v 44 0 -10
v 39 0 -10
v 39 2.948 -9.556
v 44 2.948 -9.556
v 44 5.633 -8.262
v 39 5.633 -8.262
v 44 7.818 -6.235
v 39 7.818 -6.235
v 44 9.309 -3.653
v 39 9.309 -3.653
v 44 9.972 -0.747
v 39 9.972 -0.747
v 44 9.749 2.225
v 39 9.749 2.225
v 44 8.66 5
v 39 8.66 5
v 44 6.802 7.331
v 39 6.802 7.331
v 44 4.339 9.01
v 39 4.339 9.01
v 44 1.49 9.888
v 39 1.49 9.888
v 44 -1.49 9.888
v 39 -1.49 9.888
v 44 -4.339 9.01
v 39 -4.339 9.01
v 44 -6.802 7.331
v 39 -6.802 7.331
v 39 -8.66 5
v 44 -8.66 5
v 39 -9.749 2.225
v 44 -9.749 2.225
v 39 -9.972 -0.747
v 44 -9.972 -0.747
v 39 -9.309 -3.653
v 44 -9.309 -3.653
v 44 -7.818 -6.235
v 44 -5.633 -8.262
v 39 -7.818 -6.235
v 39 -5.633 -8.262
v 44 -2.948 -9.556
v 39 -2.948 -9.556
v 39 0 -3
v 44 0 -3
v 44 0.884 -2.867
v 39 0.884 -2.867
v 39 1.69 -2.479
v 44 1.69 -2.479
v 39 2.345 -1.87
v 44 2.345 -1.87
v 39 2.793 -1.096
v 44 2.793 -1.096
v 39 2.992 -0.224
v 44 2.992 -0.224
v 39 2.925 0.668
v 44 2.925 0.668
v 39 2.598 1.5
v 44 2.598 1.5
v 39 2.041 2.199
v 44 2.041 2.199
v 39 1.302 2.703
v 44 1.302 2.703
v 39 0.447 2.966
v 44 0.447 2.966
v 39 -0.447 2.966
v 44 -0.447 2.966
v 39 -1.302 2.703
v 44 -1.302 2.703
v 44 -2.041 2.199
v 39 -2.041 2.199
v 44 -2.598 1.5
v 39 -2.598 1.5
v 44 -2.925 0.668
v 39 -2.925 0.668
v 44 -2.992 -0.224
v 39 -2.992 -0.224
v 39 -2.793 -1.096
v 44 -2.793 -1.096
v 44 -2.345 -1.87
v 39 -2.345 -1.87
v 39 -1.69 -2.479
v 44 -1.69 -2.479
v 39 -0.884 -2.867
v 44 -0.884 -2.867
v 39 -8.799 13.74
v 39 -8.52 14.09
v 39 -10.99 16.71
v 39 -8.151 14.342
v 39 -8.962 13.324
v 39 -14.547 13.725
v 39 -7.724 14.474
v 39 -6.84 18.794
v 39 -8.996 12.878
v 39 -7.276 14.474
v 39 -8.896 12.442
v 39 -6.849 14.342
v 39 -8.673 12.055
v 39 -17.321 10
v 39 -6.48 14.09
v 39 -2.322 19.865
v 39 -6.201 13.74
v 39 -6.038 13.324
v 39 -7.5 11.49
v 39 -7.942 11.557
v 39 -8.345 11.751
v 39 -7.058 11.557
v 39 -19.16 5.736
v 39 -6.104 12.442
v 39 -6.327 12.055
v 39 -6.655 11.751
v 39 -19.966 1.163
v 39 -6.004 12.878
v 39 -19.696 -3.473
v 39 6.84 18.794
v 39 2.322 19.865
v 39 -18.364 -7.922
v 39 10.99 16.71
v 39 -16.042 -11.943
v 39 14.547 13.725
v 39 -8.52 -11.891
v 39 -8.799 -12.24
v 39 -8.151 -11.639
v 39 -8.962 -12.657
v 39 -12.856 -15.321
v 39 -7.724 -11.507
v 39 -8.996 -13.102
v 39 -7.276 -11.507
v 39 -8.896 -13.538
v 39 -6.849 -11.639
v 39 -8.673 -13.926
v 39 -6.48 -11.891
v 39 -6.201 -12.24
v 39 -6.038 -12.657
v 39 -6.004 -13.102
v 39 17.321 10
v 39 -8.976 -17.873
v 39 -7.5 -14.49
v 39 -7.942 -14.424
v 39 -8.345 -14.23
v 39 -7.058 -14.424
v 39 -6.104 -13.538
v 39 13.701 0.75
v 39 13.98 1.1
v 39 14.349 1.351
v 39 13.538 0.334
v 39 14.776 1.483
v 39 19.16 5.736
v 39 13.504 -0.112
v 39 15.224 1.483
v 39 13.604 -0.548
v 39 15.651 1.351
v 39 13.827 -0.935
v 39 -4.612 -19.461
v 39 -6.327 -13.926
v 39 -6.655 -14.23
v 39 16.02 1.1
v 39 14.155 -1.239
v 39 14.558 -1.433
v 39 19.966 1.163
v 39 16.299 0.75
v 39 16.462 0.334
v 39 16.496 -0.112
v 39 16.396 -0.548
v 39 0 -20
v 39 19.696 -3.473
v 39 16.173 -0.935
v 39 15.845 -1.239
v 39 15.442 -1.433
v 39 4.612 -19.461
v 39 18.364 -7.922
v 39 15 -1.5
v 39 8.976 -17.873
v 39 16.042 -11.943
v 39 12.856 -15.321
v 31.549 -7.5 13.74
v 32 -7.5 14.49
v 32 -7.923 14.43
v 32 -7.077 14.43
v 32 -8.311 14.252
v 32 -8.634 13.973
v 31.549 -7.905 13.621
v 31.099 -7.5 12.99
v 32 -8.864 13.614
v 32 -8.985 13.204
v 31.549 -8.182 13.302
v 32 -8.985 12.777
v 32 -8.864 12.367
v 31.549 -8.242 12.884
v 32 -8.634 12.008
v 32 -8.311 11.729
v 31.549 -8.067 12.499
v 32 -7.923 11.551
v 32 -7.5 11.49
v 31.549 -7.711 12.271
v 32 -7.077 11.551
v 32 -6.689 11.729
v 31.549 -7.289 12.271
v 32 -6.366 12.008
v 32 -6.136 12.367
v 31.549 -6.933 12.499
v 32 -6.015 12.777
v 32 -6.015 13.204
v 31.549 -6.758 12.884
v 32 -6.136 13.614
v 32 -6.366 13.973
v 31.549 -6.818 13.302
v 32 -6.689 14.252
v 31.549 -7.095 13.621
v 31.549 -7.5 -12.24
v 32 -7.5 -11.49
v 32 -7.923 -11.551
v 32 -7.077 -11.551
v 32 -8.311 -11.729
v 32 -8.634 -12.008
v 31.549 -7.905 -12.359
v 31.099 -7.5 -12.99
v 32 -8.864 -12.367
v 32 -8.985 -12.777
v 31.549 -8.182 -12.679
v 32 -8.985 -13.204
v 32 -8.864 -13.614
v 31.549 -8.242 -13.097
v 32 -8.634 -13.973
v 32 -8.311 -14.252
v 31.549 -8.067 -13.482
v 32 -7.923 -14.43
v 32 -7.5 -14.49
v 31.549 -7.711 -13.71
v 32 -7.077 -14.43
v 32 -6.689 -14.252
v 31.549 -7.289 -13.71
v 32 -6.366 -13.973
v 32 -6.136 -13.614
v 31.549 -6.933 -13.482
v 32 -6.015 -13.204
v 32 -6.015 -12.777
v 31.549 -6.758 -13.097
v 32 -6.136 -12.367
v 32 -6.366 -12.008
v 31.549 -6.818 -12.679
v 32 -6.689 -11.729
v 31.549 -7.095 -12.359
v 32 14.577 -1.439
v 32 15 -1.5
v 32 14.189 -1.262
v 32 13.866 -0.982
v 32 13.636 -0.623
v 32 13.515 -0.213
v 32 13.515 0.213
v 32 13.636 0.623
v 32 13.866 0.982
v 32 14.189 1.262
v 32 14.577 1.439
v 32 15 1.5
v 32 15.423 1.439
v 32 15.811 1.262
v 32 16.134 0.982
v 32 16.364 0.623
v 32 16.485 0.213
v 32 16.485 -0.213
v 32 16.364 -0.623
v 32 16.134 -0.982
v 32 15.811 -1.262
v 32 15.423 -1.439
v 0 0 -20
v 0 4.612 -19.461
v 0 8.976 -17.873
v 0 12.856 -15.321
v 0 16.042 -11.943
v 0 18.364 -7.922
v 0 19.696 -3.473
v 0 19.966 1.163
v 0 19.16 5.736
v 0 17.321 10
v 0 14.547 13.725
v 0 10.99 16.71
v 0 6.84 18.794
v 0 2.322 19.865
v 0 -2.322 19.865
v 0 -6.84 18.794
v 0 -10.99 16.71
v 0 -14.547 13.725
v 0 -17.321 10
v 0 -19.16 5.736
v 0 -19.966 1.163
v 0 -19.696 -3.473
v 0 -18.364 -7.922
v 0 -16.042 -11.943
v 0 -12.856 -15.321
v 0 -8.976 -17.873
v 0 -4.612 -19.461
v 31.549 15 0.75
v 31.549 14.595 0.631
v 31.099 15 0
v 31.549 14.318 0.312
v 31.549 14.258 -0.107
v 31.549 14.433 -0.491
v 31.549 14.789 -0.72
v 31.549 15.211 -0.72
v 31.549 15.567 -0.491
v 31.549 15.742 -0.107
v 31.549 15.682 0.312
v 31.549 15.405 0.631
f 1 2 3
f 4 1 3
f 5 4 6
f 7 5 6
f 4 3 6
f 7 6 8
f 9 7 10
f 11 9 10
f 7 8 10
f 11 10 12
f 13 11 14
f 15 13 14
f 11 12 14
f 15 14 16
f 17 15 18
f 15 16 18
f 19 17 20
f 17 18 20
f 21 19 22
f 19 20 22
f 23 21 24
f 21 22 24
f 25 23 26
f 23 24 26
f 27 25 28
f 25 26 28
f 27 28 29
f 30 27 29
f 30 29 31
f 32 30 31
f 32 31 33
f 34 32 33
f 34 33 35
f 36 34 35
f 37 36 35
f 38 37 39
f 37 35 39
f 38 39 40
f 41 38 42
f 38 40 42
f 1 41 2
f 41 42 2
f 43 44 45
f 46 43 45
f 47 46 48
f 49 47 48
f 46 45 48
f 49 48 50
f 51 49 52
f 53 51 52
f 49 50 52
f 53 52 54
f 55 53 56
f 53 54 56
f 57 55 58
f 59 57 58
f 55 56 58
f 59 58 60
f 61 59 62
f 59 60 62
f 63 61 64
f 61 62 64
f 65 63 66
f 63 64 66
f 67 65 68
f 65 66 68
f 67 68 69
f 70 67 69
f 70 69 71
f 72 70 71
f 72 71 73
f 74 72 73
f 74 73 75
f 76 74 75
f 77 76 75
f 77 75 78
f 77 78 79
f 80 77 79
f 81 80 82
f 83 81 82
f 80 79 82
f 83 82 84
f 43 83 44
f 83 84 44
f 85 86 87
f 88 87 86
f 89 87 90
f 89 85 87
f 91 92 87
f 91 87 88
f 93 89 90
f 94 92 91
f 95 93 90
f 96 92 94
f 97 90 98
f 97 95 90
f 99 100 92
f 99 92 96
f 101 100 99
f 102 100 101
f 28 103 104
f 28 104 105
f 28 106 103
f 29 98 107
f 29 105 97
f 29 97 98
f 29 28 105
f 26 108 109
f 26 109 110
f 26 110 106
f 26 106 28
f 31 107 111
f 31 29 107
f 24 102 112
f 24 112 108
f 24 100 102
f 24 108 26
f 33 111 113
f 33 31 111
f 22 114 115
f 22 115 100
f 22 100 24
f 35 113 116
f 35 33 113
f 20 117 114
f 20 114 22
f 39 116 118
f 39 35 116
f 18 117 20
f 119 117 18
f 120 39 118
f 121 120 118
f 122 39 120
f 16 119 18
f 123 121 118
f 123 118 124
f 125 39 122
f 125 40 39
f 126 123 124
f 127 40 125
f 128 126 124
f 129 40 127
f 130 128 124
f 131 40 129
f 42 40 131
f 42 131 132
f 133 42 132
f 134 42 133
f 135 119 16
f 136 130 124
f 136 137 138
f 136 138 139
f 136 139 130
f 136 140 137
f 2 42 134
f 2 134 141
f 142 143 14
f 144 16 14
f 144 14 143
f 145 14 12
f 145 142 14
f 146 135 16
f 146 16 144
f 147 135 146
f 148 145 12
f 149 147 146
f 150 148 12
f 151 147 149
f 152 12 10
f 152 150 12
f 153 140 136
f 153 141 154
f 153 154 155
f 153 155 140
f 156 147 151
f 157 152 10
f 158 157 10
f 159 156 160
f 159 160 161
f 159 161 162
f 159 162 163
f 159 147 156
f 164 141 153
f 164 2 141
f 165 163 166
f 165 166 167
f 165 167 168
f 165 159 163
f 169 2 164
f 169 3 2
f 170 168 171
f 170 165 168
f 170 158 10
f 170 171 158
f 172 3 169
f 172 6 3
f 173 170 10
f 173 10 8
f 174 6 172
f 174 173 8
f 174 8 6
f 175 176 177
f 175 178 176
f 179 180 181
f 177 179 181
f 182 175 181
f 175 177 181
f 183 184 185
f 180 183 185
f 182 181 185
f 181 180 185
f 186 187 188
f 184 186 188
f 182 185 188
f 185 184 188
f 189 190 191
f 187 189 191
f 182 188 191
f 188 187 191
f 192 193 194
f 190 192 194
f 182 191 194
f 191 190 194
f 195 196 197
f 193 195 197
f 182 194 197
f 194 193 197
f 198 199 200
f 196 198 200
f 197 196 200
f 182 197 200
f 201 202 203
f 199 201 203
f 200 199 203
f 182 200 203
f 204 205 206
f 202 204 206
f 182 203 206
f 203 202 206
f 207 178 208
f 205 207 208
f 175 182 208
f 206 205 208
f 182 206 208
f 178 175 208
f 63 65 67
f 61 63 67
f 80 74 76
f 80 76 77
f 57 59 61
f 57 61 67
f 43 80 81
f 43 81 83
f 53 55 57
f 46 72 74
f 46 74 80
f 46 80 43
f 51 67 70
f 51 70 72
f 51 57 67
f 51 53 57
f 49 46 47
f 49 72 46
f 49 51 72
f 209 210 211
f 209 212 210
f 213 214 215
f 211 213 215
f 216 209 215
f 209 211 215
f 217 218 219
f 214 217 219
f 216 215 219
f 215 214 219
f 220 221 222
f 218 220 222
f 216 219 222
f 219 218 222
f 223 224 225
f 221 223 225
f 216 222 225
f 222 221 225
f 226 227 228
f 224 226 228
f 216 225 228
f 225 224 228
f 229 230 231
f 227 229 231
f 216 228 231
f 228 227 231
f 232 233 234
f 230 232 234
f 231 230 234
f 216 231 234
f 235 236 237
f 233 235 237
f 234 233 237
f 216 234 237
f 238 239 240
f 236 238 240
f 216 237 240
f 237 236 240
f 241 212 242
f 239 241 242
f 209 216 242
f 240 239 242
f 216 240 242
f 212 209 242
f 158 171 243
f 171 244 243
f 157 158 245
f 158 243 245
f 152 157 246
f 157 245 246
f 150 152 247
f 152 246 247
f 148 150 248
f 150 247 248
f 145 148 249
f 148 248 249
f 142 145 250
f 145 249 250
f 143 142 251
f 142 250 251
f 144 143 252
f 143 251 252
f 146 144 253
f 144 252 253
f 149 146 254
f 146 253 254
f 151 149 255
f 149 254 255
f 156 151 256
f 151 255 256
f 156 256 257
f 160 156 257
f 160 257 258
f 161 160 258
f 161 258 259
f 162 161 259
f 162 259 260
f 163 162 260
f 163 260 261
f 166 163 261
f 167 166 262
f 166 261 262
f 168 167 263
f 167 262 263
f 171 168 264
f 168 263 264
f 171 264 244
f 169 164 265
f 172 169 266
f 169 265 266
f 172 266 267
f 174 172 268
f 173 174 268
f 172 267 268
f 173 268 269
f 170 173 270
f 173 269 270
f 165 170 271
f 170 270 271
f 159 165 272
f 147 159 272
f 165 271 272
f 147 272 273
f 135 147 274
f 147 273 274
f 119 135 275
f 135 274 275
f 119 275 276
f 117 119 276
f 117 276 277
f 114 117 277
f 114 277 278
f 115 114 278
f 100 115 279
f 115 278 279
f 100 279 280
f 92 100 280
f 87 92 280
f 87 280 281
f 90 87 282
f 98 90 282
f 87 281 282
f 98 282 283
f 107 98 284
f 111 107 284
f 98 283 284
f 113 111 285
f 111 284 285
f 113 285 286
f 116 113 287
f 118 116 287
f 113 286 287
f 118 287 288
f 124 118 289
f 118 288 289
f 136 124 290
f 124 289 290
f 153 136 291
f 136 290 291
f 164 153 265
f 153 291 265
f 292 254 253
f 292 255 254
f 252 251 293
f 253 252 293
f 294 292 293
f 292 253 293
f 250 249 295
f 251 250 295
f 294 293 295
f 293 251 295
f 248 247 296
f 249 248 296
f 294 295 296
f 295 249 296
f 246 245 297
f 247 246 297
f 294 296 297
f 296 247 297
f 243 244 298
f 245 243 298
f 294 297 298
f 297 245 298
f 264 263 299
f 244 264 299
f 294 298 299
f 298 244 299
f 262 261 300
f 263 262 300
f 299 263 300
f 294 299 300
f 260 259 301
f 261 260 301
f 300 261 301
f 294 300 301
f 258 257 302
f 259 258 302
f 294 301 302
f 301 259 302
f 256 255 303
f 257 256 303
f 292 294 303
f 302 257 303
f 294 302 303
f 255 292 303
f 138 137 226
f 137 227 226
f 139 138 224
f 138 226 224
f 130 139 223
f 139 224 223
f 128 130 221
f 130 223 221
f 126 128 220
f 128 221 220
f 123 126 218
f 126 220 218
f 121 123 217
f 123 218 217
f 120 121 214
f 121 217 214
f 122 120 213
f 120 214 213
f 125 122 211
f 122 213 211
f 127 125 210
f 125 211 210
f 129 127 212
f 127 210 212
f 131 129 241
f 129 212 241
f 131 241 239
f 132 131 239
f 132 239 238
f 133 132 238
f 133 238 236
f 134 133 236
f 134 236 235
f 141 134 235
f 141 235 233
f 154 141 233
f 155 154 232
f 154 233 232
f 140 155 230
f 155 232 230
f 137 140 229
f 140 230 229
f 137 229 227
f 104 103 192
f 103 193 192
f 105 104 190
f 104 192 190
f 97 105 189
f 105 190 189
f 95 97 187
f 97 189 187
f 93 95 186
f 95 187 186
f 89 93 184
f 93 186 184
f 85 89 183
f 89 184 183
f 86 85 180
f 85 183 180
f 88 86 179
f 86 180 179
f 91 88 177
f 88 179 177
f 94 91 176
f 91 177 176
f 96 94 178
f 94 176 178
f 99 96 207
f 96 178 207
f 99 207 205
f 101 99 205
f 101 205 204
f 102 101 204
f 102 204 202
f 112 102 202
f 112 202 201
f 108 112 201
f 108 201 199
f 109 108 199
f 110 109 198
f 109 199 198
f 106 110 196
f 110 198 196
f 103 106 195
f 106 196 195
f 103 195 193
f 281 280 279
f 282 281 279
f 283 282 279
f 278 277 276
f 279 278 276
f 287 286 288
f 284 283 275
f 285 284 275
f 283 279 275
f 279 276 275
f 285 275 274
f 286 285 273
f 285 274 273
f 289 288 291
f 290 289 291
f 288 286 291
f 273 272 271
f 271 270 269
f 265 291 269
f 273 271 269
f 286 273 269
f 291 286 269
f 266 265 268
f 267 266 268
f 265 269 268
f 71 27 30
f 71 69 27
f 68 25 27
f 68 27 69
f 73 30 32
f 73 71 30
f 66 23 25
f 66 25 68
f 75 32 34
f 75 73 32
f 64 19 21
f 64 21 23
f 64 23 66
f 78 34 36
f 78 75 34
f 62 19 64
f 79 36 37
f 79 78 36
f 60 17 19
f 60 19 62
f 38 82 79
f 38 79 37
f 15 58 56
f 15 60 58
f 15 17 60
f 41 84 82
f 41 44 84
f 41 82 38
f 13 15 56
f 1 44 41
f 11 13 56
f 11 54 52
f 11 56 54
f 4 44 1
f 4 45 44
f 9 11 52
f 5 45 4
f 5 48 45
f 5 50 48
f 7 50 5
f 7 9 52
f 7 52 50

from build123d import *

# Parameters (mm, degrees)
SKETCH1_R                 = 20
BOSS_EXTRUDE1_DEPTH       = 39
SKETCH2_R                 = 10
BOSS_EXTRUDE2_DEPTH       = 5
F_3_0MM_DOWEL_HOLE1_D     = 3
F_3_0MM_DOWEL_HOLE1_DEPTH = 7
F_3_0MM_DOWEL_HOLE1_TIP   = 0.901290929
SKETCH3_R                 = 3
CUT_EXTRUDE2_DEPTH        = 5


with BuildPart() as part:
    # Sketch1 → Boss-Extrude1 (new body)
    with BuildSketch(Plane(origin=(0, 0, 0), x_dir=(0, 0, -1), z_dir=(1, 0, 0))):
        Circle(SKETCH1_R)
    extrude(amount=BOSS_EXTRUDE1_DEPTH)

    # Sketch2 → Boss-Extrude2 (add)
    with BuildSketch(Plane(origin=(39, 0, 0), x_dir=(0, 0, -1), z_dir=(1, 0, 0))):
        Circle(SKETCH2_R)
    extrude(amount=BOSS_EXTRUDE2_DEPTH)

    # Ø3.0mm Dowel Hole1
    with Locations(Plane(origin=(39, 15, 0), x_dir=(0, 0, 1), z_dir=(1, 0, 0))):
        with Locations((0, 0), (-12.990381057, 22.5), (12.990381057, 22.5)):
            Hole(F_3_0MM_DOWEL_HOLE1_D / 2, depth=F_3_0MM_DOWEL_HOLE1_DEPTH)
            with Locations((0, 0, -(F_3_0MM_DOWEL_HOLE1_DEPTH + F_3_0MM_DOWEL_HOLE1_TIP / 2))):  # 118° drill point
                Cone(0, F_3_0MM_DOWEL_HOLE1_D / 2, F_3_0MM_DOWEL_HOLE1_TIP, mode=Mode.SUBTRACT)

    # Sketch3 → Cut-Extrude2 (cut)
    with BuildSketch(Plane(origin=(44, 0, 0), x_dir=(0, 0, -1), z_dir=(1, 0, 0))):
        Circle(SKETCH3_R)
    extrude(amount=-CUT_EXTRUDE2_DEPTH, mode=Mode.SUBTRACT)


solid = part.part
